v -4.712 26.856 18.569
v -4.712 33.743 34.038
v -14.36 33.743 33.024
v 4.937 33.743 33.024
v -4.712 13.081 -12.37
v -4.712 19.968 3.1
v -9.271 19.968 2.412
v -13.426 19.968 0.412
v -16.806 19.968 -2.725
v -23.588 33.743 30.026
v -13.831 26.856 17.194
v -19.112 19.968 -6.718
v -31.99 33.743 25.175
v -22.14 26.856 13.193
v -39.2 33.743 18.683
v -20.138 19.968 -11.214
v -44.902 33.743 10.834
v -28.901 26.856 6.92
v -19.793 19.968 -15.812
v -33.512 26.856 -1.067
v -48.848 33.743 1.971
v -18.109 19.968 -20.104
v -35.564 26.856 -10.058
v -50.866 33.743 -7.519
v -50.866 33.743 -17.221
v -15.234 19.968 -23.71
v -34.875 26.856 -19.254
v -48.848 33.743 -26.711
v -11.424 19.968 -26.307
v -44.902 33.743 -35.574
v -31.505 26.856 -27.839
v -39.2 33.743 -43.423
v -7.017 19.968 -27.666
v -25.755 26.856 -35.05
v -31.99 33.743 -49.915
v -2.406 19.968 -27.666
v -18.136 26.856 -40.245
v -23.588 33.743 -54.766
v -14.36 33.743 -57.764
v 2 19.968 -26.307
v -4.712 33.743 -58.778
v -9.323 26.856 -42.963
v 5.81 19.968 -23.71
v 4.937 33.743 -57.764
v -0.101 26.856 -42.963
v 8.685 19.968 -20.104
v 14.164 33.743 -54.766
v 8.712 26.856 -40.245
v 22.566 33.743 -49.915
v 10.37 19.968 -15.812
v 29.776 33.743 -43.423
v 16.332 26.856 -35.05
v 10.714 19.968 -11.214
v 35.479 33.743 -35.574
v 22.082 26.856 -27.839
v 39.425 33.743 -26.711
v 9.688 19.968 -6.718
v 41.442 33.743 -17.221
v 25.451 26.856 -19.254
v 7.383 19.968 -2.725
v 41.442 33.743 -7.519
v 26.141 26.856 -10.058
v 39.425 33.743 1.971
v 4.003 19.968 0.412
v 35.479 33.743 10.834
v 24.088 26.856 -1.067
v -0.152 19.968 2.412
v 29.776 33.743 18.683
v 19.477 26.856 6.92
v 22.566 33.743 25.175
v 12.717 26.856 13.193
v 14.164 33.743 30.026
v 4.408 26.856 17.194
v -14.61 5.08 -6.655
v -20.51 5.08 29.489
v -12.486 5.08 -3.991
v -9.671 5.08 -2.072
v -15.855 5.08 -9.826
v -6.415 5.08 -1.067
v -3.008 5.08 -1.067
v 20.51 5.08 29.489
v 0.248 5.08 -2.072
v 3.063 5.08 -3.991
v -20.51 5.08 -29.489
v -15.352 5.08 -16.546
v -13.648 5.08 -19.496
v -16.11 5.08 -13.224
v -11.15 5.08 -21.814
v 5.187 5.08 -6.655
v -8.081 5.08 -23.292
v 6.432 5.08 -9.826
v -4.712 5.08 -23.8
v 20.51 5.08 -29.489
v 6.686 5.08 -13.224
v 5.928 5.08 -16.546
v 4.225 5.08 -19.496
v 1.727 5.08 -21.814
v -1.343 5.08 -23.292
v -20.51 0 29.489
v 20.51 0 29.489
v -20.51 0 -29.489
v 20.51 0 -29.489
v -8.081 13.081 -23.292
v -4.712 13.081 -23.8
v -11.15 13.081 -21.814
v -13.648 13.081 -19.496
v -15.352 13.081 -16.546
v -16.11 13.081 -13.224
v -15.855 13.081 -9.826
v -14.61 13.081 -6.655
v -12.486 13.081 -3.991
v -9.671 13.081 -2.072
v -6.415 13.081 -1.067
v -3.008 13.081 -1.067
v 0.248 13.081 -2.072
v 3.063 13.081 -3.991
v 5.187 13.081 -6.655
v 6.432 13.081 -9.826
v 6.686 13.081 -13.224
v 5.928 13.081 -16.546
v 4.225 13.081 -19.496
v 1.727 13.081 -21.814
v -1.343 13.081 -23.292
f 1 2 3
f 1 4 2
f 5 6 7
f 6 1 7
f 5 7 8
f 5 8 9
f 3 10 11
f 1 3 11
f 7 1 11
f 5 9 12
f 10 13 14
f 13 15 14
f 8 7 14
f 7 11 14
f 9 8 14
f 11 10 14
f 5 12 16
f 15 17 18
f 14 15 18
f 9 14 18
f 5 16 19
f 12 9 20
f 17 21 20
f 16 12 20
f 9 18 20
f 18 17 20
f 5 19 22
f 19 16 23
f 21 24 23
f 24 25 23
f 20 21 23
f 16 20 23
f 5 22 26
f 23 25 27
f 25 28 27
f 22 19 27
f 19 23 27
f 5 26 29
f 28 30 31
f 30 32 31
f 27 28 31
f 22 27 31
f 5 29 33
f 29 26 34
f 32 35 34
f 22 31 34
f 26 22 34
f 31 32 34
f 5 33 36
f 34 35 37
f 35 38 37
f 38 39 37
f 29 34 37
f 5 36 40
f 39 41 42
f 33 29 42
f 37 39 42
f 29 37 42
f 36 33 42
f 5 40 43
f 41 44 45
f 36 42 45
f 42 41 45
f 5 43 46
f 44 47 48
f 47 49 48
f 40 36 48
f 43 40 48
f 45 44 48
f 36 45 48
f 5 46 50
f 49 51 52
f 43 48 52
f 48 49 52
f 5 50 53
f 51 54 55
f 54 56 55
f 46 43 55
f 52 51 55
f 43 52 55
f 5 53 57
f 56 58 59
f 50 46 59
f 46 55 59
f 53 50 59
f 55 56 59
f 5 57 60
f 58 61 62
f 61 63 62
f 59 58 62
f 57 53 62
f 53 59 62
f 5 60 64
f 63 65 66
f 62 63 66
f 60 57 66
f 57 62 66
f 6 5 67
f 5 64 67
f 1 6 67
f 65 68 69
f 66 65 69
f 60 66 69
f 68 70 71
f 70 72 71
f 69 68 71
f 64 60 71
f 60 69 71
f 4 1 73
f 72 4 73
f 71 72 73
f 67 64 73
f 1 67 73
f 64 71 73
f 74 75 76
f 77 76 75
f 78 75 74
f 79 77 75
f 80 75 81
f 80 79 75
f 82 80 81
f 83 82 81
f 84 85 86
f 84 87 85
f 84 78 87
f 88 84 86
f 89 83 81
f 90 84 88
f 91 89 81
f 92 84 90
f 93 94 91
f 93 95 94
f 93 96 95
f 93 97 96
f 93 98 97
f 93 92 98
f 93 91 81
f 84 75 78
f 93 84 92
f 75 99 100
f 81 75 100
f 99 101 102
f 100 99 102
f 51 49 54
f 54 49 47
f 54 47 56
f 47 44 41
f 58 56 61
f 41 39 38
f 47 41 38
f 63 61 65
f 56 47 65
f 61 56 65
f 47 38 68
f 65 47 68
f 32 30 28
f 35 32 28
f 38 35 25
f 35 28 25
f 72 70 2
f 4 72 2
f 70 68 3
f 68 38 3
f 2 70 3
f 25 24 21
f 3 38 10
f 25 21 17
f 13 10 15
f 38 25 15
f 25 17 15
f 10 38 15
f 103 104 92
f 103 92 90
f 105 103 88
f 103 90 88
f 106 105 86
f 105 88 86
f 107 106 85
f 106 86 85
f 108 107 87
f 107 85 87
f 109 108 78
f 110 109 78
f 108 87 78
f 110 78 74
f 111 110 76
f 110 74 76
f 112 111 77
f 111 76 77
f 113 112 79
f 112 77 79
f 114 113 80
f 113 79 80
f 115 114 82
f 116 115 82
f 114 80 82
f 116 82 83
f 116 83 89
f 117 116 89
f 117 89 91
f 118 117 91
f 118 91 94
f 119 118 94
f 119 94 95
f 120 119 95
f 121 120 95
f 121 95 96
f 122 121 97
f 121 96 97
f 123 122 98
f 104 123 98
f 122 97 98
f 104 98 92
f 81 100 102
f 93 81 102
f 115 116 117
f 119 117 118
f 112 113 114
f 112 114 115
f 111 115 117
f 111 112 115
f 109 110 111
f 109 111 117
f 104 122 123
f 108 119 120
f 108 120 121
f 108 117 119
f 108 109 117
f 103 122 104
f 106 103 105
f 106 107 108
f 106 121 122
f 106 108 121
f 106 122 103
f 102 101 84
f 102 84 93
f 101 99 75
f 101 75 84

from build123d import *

# Parameters (mm, degrees)
SKETCH1_W           = 41.021
SKETCH1_H           = 58.9788
BOSS_EXTRUDE1_DEPTH = 5.08
SKETCH2_R           = 11.43
BOSS_EXTRUDE2_DEPTH = 8.001


with BuildPart() as part:
    # Sketch1 → Boss-Extrude1 (new body)
    with BuildSketch(Plane(origin=(0, 0, 0), x_dir=(1, 0, 0), z_dir=(0, 1, 0))):
        Rectangle(SKETCH1_W, SKETCH1_H)
    extrude(amount=BOSS_EXTRUDE1_DEPTH)

    # Sketch2 → Boss-Extrude2 (add)
    with BuildSketch(Plane(origin=(0, 5.08, 0), x_dir=(1, 0, 0), z_dir=(0, 1, 0))):
        with Locations(Location((-4.7117, 12.3698, 0), (0, 0, 90))):
            Circle(SKETCH2_R)
    extrude(amount=BOSS_EXTRUDE2_DEPTH)


with BuildPart() as body_2:
    # Sketch6 → Revolve1 (revolve)
    with BuildSketch(Plane(origin=(-4.7117, 0, 0), x_dir=(0, 0, -1), z_dir=(1, 0, 0)), mode=Mode.PRIVATE) as revolve1_sk:
        Polygon((12.3698, 13.081), (58.777909248, 33.743221468), (12.3698, 33.743221468), align=None)
    revolve(revolve1_sk.sketch.rotate(Axis((-4.7117, 33.743221468, -12.3698), (0, -1, 0)), 180), axis=Axis((-4.7117, 33.743221468, -12.3698), (0, -1, 0)))


solid = Compound([part.part, body_2.part])
